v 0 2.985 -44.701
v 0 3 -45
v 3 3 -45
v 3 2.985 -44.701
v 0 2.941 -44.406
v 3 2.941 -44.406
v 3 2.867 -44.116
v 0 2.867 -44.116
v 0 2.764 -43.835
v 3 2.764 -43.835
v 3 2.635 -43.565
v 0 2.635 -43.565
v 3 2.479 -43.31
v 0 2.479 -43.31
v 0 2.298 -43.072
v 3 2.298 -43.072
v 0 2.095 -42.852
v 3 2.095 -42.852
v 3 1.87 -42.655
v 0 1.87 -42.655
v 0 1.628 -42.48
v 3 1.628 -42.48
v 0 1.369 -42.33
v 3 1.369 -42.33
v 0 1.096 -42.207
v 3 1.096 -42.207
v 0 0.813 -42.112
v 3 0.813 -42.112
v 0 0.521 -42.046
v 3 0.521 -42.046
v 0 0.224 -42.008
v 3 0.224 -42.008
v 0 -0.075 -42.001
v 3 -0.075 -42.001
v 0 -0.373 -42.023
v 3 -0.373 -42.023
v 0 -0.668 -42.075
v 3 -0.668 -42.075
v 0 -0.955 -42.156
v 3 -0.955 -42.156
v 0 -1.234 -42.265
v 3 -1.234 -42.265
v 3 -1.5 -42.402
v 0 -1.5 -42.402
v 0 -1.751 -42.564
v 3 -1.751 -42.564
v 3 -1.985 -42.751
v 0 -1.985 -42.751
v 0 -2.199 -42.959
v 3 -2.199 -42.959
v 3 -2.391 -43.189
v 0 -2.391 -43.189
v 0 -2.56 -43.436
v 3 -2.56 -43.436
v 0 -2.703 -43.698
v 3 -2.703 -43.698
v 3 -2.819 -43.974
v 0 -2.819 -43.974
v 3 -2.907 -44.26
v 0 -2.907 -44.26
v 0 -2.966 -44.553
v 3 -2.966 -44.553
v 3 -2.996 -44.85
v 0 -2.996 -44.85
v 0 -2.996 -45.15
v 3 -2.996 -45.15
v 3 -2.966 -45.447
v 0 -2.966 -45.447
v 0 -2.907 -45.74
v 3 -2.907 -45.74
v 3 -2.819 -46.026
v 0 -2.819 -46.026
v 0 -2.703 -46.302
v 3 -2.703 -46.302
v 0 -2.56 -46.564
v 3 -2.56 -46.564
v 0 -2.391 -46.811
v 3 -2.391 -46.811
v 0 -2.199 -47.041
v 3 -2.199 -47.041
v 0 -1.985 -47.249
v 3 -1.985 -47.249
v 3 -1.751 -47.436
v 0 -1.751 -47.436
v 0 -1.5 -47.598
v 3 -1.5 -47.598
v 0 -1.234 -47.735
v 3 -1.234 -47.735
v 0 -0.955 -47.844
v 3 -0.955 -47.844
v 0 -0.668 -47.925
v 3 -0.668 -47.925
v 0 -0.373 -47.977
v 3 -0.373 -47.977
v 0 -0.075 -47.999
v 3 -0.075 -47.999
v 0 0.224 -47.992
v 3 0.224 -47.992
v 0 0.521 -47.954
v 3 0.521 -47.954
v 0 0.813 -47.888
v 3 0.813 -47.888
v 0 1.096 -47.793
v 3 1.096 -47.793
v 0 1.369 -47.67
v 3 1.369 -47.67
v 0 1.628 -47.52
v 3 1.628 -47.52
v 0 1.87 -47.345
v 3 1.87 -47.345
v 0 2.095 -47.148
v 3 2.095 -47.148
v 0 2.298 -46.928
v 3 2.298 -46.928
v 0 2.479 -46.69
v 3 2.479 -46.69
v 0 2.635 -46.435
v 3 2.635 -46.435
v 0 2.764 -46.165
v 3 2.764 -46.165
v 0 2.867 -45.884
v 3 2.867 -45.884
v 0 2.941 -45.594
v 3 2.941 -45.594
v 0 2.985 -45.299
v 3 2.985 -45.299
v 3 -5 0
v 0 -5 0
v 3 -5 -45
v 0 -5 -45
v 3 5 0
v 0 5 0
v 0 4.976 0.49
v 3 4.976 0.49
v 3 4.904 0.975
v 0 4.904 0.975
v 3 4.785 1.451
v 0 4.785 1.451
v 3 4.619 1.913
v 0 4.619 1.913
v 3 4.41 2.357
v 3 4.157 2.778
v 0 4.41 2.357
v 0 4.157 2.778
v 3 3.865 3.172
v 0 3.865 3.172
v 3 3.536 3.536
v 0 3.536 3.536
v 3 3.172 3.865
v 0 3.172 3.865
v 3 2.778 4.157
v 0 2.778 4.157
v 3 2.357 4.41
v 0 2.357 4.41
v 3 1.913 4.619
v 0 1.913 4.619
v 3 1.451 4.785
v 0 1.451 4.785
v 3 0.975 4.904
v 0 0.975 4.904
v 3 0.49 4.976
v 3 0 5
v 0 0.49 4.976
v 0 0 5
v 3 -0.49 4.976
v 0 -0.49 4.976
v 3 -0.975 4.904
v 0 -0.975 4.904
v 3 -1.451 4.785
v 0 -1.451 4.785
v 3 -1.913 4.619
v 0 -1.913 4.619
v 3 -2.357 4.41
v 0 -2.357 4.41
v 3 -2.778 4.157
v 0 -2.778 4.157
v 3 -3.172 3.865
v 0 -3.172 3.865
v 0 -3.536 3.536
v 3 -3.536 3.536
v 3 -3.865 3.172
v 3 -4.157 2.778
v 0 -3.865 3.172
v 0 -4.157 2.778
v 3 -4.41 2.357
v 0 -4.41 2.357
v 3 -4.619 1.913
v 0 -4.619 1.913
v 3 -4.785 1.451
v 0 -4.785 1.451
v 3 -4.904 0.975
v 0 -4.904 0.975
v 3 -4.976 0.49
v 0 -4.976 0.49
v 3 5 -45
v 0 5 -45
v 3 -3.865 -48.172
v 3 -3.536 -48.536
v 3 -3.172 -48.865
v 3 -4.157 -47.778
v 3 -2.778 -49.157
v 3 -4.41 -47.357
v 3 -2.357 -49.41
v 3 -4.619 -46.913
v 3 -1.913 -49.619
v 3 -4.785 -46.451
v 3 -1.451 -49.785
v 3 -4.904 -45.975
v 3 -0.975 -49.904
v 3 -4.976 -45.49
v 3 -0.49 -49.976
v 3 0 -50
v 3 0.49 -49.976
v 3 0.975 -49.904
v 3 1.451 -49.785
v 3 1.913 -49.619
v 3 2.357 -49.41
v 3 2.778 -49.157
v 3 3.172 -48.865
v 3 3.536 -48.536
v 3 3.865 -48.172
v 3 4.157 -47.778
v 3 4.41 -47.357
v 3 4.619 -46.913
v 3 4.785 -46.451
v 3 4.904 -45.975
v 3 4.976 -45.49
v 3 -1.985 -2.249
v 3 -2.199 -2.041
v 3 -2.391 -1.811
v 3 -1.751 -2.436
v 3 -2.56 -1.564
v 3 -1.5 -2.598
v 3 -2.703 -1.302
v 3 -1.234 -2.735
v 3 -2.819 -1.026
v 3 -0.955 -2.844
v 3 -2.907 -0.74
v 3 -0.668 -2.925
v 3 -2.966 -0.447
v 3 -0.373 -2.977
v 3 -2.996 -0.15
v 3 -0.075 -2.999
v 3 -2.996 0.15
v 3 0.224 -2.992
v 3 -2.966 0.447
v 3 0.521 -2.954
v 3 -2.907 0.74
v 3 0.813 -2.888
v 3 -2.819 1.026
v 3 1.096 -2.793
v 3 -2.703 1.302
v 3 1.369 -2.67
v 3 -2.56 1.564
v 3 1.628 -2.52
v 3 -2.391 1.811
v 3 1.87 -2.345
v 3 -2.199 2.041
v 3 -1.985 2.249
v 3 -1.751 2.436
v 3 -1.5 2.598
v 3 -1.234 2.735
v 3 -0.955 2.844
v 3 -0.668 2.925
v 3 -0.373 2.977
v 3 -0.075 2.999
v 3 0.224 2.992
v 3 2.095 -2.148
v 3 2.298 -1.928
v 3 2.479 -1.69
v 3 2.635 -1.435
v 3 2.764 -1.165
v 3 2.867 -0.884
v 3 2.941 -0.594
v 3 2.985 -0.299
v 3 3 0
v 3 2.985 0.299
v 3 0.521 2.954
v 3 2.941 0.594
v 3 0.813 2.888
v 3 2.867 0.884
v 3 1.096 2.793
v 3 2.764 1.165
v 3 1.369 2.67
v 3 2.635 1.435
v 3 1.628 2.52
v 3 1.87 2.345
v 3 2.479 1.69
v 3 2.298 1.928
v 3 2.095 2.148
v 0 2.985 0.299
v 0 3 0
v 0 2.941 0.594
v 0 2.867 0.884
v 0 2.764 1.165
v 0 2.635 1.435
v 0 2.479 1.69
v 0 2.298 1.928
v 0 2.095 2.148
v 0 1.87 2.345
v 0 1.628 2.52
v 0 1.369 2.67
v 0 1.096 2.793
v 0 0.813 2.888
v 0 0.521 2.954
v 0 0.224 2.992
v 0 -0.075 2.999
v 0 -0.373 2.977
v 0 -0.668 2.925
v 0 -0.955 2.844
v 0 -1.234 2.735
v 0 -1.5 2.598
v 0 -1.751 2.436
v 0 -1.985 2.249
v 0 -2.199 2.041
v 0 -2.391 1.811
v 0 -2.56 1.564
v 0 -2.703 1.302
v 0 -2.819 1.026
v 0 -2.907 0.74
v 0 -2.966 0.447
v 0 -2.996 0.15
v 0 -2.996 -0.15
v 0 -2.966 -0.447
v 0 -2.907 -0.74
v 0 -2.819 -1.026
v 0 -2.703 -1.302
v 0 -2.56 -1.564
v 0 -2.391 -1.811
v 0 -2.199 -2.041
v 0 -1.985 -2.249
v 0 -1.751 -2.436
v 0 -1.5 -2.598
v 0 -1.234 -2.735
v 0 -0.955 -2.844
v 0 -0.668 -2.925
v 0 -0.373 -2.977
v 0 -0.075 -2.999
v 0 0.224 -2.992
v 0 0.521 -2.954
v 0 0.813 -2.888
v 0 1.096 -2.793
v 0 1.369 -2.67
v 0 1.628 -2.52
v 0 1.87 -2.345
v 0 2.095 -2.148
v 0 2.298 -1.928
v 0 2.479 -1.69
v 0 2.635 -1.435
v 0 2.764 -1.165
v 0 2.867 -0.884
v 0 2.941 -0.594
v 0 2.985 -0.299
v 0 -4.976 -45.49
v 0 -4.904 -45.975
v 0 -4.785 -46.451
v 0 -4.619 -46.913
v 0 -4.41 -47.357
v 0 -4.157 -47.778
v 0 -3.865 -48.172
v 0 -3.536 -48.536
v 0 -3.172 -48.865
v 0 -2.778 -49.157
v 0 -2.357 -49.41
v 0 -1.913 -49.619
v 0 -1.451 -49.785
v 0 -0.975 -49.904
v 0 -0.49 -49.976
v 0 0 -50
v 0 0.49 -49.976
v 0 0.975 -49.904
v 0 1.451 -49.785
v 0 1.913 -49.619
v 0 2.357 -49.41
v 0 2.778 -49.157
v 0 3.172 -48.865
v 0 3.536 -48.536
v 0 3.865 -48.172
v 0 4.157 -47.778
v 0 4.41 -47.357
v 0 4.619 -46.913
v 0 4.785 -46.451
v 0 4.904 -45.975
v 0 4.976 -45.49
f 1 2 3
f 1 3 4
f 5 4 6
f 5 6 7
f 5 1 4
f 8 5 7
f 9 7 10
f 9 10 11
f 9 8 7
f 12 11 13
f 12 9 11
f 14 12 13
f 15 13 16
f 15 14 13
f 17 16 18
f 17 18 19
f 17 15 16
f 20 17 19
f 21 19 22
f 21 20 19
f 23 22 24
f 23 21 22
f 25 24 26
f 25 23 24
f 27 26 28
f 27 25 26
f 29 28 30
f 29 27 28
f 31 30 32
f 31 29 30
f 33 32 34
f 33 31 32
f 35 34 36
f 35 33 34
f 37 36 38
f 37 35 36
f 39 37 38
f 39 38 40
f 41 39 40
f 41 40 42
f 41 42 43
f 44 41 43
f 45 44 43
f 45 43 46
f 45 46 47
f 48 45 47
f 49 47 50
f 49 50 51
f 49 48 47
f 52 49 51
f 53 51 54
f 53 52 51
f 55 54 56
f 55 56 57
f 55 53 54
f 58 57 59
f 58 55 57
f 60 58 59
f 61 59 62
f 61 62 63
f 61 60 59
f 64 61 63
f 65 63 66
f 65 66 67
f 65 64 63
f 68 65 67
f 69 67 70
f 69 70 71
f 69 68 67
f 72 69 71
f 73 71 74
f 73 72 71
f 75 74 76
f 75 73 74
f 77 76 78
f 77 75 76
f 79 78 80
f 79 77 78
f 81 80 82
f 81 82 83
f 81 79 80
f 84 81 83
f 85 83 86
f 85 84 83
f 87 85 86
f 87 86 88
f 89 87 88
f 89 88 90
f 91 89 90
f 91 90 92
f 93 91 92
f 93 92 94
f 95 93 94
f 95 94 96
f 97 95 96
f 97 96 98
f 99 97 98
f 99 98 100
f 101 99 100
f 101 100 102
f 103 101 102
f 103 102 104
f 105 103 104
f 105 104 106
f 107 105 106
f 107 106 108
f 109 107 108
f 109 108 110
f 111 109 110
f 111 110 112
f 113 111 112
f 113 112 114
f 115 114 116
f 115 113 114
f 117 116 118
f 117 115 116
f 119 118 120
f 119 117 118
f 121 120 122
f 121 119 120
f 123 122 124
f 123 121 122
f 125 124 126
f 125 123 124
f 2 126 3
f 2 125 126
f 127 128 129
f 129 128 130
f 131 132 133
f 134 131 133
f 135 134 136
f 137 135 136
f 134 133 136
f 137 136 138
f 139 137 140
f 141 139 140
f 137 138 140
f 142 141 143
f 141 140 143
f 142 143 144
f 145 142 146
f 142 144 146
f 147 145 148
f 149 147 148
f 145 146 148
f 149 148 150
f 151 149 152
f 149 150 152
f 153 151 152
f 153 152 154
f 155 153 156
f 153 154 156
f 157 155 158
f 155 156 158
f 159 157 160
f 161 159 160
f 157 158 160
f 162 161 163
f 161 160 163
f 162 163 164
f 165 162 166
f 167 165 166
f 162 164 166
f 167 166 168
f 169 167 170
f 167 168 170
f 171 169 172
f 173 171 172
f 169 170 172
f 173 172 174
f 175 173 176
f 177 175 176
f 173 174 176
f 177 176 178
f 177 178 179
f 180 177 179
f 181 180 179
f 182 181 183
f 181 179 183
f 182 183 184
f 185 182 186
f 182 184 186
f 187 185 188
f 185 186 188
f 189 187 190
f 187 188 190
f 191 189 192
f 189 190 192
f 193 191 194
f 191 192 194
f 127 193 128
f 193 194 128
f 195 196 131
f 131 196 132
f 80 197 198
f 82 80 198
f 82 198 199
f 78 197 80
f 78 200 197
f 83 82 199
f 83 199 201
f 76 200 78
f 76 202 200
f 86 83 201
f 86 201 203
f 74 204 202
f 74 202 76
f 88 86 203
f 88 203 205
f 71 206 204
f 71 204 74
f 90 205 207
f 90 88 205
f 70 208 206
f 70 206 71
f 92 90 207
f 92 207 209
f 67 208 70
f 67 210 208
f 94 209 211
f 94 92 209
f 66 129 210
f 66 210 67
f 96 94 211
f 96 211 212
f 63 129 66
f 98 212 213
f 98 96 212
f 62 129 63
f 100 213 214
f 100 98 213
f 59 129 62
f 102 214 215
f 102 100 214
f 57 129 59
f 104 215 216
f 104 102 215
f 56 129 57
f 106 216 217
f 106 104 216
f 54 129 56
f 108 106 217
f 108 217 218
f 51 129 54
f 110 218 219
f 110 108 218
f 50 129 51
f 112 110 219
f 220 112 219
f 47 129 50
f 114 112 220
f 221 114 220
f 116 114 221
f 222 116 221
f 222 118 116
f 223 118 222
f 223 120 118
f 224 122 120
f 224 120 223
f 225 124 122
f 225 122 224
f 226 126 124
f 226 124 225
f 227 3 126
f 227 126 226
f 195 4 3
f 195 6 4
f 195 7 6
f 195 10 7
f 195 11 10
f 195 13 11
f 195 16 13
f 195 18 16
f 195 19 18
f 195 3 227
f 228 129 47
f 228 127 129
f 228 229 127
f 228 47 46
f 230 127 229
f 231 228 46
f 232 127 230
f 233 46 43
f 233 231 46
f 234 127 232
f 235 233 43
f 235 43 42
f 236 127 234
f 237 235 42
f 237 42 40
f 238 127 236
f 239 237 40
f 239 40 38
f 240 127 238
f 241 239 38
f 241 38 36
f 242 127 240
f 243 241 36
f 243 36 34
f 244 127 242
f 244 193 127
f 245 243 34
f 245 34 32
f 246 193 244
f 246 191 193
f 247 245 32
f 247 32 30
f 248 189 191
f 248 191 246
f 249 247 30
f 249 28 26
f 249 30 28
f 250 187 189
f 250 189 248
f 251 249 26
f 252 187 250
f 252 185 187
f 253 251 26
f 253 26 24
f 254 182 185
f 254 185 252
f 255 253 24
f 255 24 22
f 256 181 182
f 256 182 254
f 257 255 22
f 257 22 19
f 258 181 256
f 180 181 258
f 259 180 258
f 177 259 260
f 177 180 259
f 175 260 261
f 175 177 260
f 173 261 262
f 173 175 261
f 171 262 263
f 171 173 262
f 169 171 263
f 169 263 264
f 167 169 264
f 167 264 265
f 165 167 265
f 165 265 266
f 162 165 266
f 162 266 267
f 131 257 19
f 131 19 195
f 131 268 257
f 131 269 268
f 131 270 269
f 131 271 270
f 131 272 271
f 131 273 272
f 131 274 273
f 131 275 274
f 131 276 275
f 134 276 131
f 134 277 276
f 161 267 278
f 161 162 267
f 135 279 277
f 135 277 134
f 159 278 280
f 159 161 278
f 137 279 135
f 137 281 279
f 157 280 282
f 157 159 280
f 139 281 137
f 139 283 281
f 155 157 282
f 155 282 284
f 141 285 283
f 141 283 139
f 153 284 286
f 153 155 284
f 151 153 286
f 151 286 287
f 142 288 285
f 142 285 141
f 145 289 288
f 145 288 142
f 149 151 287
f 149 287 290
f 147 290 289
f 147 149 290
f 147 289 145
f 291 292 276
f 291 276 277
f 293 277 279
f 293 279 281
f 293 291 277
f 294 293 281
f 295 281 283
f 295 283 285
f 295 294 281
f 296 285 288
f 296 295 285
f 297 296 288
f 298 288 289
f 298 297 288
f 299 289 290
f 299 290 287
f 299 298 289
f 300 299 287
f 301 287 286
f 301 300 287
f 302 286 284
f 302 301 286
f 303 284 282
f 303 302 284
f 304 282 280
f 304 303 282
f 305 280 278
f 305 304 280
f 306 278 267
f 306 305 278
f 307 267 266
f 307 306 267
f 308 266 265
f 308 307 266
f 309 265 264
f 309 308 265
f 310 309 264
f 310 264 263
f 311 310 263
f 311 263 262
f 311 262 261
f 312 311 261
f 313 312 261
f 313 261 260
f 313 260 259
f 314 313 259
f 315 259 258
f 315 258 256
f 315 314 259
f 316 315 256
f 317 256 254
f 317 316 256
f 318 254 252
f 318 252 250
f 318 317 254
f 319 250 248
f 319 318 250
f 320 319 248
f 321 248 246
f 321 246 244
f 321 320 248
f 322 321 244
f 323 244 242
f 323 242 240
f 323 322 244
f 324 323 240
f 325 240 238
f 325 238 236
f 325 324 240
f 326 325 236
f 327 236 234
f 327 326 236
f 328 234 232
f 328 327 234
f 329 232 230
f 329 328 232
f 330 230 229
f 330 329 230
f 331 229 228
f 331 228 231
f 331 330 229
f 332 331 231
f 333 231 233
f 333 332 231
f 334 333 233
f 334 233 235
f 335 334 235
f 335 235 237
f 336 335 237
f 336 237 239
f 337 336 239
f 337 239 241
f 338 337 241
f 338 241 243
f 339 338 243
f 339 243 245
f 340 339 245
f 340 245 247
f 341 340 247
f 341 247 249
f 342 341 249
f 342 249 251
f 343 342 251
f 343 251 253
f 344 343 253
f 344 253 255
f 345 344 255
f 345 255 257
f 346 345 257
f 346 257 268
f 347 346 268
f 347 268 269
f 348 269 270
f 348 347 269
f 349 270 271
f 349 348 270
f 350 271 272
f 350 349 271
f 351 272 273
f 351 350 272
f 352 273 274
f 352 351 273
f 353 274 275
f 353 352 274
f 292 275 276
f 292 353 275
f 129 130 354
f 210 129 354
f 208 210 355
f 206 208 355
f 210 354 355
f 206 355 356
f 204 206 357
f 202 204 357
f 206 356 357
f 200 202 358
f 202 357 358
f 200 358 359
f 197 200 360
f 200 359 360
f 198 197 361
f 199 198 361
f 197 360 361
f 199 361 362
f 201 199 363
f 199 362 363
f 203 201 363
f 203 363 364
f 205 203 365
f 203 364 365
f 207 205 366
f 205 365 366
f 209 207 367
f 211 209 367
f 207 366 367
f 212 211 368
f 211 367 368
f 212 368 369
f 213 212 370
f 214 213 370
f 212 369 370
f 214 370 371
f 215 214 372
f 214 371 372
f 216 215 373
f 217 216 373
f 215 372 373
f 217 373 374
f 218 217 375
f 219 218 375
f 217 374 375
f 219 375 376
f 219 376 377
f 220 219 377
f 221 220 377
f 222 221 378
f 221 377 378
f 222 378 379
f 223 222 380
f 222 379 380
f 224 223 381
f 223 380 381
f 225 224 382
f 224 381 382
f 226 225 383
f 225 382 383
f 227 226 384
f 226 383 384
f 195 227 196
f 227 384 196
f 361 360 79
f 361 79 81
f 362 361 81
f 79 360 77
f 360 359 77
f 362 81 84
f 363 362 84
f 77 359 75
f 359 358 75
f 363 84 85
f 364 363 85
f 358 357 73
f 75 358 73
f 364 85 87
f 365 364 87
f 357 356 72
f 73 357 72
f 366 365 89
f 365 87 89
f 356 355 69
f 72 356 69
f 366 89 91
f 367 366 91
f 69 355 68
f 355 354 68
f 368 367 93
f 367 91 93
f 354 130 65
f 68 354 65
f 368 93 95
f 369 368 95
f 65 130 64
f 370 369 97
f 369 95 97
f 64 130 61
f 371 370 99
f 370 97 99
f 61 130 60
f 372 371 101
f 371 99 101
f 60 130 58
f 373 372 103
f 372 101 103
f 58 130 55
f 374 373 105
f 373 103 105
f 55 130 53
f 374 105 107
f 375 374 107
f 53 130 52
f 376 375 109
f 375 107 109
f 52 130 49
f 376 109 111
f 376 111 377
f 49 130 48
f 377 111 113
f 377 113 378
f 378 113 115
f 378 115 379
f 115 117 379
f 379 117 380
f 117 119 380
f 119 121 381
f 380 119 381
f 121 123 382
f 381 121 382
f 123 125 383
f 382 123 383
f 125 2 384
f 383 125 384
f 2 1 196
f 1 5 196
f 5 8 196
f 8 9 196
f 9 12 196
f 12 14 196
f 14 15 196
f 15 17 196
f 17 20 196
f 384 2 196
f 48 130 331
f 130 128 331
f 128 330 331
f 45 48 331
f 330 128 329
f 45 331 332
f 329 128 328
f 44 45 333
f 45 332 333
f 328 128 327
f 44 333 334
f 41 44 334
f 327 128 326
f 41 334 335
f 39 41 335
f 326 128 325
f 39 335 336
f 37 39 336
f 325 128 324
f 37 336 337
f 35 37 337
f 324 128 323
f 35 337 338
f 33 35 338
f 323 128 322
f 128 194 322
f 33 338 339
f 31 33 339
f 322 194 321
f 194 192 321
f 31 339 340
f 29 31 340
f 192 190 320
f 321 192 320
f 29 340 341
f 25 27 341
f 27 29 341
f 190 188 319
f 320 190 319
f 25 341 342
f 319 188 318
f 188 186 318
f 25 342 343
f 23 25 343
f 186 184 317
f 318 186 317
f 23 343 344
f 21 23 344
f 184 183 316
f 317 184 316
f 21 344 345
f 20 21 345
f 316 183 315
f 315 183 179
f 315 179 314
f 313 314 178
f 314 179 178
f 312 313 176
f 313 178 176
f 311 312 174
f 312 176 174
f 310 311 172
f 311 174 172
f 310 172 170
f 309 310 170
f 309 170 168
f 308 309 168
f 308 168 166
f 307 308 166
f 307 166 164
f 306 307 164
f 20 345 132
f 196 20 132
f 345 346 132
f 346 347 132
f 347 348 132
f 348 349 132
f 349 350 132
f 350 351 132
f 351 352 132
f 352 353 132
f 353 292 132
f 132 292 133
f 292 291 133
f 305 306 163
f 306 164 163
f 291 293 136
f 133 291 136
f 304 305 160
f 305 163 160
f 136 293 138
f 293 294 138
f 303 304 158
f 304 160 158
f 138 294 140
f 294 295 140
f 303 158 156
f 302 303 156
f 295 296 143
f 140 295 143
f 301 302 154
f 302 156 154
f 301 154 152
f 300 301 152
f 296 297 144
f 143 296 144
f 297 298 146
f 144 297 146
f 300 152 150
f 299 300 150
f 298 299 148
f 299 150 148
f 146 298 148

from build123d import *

# Parameters (mm, degrees)
F0_R     = 3
F1_DEPTH = 3


with BuildPart() as f1:
    # F0 (on Right) → F1 (new body)
    with BuildSketch(Plane.YZ):
        with BuildLine():
            ThreePointArc((5, 0), (0, 5), (-5, 0))
            Line((-5, 0), (-5, -45))
            ThreePointArc((-5, -45), (0, -50), (5, -45))
            Line((5, -45), (5, 0))
        make_face()
        with Locations((0, -45)):
            Circle(F0_R, mode=Mode.SUBTRACT)
        Circle(F0_R, mode=Mode.SUBTRACT)
    extrude(amount=F1_DEPTH)


solid = f1.part
